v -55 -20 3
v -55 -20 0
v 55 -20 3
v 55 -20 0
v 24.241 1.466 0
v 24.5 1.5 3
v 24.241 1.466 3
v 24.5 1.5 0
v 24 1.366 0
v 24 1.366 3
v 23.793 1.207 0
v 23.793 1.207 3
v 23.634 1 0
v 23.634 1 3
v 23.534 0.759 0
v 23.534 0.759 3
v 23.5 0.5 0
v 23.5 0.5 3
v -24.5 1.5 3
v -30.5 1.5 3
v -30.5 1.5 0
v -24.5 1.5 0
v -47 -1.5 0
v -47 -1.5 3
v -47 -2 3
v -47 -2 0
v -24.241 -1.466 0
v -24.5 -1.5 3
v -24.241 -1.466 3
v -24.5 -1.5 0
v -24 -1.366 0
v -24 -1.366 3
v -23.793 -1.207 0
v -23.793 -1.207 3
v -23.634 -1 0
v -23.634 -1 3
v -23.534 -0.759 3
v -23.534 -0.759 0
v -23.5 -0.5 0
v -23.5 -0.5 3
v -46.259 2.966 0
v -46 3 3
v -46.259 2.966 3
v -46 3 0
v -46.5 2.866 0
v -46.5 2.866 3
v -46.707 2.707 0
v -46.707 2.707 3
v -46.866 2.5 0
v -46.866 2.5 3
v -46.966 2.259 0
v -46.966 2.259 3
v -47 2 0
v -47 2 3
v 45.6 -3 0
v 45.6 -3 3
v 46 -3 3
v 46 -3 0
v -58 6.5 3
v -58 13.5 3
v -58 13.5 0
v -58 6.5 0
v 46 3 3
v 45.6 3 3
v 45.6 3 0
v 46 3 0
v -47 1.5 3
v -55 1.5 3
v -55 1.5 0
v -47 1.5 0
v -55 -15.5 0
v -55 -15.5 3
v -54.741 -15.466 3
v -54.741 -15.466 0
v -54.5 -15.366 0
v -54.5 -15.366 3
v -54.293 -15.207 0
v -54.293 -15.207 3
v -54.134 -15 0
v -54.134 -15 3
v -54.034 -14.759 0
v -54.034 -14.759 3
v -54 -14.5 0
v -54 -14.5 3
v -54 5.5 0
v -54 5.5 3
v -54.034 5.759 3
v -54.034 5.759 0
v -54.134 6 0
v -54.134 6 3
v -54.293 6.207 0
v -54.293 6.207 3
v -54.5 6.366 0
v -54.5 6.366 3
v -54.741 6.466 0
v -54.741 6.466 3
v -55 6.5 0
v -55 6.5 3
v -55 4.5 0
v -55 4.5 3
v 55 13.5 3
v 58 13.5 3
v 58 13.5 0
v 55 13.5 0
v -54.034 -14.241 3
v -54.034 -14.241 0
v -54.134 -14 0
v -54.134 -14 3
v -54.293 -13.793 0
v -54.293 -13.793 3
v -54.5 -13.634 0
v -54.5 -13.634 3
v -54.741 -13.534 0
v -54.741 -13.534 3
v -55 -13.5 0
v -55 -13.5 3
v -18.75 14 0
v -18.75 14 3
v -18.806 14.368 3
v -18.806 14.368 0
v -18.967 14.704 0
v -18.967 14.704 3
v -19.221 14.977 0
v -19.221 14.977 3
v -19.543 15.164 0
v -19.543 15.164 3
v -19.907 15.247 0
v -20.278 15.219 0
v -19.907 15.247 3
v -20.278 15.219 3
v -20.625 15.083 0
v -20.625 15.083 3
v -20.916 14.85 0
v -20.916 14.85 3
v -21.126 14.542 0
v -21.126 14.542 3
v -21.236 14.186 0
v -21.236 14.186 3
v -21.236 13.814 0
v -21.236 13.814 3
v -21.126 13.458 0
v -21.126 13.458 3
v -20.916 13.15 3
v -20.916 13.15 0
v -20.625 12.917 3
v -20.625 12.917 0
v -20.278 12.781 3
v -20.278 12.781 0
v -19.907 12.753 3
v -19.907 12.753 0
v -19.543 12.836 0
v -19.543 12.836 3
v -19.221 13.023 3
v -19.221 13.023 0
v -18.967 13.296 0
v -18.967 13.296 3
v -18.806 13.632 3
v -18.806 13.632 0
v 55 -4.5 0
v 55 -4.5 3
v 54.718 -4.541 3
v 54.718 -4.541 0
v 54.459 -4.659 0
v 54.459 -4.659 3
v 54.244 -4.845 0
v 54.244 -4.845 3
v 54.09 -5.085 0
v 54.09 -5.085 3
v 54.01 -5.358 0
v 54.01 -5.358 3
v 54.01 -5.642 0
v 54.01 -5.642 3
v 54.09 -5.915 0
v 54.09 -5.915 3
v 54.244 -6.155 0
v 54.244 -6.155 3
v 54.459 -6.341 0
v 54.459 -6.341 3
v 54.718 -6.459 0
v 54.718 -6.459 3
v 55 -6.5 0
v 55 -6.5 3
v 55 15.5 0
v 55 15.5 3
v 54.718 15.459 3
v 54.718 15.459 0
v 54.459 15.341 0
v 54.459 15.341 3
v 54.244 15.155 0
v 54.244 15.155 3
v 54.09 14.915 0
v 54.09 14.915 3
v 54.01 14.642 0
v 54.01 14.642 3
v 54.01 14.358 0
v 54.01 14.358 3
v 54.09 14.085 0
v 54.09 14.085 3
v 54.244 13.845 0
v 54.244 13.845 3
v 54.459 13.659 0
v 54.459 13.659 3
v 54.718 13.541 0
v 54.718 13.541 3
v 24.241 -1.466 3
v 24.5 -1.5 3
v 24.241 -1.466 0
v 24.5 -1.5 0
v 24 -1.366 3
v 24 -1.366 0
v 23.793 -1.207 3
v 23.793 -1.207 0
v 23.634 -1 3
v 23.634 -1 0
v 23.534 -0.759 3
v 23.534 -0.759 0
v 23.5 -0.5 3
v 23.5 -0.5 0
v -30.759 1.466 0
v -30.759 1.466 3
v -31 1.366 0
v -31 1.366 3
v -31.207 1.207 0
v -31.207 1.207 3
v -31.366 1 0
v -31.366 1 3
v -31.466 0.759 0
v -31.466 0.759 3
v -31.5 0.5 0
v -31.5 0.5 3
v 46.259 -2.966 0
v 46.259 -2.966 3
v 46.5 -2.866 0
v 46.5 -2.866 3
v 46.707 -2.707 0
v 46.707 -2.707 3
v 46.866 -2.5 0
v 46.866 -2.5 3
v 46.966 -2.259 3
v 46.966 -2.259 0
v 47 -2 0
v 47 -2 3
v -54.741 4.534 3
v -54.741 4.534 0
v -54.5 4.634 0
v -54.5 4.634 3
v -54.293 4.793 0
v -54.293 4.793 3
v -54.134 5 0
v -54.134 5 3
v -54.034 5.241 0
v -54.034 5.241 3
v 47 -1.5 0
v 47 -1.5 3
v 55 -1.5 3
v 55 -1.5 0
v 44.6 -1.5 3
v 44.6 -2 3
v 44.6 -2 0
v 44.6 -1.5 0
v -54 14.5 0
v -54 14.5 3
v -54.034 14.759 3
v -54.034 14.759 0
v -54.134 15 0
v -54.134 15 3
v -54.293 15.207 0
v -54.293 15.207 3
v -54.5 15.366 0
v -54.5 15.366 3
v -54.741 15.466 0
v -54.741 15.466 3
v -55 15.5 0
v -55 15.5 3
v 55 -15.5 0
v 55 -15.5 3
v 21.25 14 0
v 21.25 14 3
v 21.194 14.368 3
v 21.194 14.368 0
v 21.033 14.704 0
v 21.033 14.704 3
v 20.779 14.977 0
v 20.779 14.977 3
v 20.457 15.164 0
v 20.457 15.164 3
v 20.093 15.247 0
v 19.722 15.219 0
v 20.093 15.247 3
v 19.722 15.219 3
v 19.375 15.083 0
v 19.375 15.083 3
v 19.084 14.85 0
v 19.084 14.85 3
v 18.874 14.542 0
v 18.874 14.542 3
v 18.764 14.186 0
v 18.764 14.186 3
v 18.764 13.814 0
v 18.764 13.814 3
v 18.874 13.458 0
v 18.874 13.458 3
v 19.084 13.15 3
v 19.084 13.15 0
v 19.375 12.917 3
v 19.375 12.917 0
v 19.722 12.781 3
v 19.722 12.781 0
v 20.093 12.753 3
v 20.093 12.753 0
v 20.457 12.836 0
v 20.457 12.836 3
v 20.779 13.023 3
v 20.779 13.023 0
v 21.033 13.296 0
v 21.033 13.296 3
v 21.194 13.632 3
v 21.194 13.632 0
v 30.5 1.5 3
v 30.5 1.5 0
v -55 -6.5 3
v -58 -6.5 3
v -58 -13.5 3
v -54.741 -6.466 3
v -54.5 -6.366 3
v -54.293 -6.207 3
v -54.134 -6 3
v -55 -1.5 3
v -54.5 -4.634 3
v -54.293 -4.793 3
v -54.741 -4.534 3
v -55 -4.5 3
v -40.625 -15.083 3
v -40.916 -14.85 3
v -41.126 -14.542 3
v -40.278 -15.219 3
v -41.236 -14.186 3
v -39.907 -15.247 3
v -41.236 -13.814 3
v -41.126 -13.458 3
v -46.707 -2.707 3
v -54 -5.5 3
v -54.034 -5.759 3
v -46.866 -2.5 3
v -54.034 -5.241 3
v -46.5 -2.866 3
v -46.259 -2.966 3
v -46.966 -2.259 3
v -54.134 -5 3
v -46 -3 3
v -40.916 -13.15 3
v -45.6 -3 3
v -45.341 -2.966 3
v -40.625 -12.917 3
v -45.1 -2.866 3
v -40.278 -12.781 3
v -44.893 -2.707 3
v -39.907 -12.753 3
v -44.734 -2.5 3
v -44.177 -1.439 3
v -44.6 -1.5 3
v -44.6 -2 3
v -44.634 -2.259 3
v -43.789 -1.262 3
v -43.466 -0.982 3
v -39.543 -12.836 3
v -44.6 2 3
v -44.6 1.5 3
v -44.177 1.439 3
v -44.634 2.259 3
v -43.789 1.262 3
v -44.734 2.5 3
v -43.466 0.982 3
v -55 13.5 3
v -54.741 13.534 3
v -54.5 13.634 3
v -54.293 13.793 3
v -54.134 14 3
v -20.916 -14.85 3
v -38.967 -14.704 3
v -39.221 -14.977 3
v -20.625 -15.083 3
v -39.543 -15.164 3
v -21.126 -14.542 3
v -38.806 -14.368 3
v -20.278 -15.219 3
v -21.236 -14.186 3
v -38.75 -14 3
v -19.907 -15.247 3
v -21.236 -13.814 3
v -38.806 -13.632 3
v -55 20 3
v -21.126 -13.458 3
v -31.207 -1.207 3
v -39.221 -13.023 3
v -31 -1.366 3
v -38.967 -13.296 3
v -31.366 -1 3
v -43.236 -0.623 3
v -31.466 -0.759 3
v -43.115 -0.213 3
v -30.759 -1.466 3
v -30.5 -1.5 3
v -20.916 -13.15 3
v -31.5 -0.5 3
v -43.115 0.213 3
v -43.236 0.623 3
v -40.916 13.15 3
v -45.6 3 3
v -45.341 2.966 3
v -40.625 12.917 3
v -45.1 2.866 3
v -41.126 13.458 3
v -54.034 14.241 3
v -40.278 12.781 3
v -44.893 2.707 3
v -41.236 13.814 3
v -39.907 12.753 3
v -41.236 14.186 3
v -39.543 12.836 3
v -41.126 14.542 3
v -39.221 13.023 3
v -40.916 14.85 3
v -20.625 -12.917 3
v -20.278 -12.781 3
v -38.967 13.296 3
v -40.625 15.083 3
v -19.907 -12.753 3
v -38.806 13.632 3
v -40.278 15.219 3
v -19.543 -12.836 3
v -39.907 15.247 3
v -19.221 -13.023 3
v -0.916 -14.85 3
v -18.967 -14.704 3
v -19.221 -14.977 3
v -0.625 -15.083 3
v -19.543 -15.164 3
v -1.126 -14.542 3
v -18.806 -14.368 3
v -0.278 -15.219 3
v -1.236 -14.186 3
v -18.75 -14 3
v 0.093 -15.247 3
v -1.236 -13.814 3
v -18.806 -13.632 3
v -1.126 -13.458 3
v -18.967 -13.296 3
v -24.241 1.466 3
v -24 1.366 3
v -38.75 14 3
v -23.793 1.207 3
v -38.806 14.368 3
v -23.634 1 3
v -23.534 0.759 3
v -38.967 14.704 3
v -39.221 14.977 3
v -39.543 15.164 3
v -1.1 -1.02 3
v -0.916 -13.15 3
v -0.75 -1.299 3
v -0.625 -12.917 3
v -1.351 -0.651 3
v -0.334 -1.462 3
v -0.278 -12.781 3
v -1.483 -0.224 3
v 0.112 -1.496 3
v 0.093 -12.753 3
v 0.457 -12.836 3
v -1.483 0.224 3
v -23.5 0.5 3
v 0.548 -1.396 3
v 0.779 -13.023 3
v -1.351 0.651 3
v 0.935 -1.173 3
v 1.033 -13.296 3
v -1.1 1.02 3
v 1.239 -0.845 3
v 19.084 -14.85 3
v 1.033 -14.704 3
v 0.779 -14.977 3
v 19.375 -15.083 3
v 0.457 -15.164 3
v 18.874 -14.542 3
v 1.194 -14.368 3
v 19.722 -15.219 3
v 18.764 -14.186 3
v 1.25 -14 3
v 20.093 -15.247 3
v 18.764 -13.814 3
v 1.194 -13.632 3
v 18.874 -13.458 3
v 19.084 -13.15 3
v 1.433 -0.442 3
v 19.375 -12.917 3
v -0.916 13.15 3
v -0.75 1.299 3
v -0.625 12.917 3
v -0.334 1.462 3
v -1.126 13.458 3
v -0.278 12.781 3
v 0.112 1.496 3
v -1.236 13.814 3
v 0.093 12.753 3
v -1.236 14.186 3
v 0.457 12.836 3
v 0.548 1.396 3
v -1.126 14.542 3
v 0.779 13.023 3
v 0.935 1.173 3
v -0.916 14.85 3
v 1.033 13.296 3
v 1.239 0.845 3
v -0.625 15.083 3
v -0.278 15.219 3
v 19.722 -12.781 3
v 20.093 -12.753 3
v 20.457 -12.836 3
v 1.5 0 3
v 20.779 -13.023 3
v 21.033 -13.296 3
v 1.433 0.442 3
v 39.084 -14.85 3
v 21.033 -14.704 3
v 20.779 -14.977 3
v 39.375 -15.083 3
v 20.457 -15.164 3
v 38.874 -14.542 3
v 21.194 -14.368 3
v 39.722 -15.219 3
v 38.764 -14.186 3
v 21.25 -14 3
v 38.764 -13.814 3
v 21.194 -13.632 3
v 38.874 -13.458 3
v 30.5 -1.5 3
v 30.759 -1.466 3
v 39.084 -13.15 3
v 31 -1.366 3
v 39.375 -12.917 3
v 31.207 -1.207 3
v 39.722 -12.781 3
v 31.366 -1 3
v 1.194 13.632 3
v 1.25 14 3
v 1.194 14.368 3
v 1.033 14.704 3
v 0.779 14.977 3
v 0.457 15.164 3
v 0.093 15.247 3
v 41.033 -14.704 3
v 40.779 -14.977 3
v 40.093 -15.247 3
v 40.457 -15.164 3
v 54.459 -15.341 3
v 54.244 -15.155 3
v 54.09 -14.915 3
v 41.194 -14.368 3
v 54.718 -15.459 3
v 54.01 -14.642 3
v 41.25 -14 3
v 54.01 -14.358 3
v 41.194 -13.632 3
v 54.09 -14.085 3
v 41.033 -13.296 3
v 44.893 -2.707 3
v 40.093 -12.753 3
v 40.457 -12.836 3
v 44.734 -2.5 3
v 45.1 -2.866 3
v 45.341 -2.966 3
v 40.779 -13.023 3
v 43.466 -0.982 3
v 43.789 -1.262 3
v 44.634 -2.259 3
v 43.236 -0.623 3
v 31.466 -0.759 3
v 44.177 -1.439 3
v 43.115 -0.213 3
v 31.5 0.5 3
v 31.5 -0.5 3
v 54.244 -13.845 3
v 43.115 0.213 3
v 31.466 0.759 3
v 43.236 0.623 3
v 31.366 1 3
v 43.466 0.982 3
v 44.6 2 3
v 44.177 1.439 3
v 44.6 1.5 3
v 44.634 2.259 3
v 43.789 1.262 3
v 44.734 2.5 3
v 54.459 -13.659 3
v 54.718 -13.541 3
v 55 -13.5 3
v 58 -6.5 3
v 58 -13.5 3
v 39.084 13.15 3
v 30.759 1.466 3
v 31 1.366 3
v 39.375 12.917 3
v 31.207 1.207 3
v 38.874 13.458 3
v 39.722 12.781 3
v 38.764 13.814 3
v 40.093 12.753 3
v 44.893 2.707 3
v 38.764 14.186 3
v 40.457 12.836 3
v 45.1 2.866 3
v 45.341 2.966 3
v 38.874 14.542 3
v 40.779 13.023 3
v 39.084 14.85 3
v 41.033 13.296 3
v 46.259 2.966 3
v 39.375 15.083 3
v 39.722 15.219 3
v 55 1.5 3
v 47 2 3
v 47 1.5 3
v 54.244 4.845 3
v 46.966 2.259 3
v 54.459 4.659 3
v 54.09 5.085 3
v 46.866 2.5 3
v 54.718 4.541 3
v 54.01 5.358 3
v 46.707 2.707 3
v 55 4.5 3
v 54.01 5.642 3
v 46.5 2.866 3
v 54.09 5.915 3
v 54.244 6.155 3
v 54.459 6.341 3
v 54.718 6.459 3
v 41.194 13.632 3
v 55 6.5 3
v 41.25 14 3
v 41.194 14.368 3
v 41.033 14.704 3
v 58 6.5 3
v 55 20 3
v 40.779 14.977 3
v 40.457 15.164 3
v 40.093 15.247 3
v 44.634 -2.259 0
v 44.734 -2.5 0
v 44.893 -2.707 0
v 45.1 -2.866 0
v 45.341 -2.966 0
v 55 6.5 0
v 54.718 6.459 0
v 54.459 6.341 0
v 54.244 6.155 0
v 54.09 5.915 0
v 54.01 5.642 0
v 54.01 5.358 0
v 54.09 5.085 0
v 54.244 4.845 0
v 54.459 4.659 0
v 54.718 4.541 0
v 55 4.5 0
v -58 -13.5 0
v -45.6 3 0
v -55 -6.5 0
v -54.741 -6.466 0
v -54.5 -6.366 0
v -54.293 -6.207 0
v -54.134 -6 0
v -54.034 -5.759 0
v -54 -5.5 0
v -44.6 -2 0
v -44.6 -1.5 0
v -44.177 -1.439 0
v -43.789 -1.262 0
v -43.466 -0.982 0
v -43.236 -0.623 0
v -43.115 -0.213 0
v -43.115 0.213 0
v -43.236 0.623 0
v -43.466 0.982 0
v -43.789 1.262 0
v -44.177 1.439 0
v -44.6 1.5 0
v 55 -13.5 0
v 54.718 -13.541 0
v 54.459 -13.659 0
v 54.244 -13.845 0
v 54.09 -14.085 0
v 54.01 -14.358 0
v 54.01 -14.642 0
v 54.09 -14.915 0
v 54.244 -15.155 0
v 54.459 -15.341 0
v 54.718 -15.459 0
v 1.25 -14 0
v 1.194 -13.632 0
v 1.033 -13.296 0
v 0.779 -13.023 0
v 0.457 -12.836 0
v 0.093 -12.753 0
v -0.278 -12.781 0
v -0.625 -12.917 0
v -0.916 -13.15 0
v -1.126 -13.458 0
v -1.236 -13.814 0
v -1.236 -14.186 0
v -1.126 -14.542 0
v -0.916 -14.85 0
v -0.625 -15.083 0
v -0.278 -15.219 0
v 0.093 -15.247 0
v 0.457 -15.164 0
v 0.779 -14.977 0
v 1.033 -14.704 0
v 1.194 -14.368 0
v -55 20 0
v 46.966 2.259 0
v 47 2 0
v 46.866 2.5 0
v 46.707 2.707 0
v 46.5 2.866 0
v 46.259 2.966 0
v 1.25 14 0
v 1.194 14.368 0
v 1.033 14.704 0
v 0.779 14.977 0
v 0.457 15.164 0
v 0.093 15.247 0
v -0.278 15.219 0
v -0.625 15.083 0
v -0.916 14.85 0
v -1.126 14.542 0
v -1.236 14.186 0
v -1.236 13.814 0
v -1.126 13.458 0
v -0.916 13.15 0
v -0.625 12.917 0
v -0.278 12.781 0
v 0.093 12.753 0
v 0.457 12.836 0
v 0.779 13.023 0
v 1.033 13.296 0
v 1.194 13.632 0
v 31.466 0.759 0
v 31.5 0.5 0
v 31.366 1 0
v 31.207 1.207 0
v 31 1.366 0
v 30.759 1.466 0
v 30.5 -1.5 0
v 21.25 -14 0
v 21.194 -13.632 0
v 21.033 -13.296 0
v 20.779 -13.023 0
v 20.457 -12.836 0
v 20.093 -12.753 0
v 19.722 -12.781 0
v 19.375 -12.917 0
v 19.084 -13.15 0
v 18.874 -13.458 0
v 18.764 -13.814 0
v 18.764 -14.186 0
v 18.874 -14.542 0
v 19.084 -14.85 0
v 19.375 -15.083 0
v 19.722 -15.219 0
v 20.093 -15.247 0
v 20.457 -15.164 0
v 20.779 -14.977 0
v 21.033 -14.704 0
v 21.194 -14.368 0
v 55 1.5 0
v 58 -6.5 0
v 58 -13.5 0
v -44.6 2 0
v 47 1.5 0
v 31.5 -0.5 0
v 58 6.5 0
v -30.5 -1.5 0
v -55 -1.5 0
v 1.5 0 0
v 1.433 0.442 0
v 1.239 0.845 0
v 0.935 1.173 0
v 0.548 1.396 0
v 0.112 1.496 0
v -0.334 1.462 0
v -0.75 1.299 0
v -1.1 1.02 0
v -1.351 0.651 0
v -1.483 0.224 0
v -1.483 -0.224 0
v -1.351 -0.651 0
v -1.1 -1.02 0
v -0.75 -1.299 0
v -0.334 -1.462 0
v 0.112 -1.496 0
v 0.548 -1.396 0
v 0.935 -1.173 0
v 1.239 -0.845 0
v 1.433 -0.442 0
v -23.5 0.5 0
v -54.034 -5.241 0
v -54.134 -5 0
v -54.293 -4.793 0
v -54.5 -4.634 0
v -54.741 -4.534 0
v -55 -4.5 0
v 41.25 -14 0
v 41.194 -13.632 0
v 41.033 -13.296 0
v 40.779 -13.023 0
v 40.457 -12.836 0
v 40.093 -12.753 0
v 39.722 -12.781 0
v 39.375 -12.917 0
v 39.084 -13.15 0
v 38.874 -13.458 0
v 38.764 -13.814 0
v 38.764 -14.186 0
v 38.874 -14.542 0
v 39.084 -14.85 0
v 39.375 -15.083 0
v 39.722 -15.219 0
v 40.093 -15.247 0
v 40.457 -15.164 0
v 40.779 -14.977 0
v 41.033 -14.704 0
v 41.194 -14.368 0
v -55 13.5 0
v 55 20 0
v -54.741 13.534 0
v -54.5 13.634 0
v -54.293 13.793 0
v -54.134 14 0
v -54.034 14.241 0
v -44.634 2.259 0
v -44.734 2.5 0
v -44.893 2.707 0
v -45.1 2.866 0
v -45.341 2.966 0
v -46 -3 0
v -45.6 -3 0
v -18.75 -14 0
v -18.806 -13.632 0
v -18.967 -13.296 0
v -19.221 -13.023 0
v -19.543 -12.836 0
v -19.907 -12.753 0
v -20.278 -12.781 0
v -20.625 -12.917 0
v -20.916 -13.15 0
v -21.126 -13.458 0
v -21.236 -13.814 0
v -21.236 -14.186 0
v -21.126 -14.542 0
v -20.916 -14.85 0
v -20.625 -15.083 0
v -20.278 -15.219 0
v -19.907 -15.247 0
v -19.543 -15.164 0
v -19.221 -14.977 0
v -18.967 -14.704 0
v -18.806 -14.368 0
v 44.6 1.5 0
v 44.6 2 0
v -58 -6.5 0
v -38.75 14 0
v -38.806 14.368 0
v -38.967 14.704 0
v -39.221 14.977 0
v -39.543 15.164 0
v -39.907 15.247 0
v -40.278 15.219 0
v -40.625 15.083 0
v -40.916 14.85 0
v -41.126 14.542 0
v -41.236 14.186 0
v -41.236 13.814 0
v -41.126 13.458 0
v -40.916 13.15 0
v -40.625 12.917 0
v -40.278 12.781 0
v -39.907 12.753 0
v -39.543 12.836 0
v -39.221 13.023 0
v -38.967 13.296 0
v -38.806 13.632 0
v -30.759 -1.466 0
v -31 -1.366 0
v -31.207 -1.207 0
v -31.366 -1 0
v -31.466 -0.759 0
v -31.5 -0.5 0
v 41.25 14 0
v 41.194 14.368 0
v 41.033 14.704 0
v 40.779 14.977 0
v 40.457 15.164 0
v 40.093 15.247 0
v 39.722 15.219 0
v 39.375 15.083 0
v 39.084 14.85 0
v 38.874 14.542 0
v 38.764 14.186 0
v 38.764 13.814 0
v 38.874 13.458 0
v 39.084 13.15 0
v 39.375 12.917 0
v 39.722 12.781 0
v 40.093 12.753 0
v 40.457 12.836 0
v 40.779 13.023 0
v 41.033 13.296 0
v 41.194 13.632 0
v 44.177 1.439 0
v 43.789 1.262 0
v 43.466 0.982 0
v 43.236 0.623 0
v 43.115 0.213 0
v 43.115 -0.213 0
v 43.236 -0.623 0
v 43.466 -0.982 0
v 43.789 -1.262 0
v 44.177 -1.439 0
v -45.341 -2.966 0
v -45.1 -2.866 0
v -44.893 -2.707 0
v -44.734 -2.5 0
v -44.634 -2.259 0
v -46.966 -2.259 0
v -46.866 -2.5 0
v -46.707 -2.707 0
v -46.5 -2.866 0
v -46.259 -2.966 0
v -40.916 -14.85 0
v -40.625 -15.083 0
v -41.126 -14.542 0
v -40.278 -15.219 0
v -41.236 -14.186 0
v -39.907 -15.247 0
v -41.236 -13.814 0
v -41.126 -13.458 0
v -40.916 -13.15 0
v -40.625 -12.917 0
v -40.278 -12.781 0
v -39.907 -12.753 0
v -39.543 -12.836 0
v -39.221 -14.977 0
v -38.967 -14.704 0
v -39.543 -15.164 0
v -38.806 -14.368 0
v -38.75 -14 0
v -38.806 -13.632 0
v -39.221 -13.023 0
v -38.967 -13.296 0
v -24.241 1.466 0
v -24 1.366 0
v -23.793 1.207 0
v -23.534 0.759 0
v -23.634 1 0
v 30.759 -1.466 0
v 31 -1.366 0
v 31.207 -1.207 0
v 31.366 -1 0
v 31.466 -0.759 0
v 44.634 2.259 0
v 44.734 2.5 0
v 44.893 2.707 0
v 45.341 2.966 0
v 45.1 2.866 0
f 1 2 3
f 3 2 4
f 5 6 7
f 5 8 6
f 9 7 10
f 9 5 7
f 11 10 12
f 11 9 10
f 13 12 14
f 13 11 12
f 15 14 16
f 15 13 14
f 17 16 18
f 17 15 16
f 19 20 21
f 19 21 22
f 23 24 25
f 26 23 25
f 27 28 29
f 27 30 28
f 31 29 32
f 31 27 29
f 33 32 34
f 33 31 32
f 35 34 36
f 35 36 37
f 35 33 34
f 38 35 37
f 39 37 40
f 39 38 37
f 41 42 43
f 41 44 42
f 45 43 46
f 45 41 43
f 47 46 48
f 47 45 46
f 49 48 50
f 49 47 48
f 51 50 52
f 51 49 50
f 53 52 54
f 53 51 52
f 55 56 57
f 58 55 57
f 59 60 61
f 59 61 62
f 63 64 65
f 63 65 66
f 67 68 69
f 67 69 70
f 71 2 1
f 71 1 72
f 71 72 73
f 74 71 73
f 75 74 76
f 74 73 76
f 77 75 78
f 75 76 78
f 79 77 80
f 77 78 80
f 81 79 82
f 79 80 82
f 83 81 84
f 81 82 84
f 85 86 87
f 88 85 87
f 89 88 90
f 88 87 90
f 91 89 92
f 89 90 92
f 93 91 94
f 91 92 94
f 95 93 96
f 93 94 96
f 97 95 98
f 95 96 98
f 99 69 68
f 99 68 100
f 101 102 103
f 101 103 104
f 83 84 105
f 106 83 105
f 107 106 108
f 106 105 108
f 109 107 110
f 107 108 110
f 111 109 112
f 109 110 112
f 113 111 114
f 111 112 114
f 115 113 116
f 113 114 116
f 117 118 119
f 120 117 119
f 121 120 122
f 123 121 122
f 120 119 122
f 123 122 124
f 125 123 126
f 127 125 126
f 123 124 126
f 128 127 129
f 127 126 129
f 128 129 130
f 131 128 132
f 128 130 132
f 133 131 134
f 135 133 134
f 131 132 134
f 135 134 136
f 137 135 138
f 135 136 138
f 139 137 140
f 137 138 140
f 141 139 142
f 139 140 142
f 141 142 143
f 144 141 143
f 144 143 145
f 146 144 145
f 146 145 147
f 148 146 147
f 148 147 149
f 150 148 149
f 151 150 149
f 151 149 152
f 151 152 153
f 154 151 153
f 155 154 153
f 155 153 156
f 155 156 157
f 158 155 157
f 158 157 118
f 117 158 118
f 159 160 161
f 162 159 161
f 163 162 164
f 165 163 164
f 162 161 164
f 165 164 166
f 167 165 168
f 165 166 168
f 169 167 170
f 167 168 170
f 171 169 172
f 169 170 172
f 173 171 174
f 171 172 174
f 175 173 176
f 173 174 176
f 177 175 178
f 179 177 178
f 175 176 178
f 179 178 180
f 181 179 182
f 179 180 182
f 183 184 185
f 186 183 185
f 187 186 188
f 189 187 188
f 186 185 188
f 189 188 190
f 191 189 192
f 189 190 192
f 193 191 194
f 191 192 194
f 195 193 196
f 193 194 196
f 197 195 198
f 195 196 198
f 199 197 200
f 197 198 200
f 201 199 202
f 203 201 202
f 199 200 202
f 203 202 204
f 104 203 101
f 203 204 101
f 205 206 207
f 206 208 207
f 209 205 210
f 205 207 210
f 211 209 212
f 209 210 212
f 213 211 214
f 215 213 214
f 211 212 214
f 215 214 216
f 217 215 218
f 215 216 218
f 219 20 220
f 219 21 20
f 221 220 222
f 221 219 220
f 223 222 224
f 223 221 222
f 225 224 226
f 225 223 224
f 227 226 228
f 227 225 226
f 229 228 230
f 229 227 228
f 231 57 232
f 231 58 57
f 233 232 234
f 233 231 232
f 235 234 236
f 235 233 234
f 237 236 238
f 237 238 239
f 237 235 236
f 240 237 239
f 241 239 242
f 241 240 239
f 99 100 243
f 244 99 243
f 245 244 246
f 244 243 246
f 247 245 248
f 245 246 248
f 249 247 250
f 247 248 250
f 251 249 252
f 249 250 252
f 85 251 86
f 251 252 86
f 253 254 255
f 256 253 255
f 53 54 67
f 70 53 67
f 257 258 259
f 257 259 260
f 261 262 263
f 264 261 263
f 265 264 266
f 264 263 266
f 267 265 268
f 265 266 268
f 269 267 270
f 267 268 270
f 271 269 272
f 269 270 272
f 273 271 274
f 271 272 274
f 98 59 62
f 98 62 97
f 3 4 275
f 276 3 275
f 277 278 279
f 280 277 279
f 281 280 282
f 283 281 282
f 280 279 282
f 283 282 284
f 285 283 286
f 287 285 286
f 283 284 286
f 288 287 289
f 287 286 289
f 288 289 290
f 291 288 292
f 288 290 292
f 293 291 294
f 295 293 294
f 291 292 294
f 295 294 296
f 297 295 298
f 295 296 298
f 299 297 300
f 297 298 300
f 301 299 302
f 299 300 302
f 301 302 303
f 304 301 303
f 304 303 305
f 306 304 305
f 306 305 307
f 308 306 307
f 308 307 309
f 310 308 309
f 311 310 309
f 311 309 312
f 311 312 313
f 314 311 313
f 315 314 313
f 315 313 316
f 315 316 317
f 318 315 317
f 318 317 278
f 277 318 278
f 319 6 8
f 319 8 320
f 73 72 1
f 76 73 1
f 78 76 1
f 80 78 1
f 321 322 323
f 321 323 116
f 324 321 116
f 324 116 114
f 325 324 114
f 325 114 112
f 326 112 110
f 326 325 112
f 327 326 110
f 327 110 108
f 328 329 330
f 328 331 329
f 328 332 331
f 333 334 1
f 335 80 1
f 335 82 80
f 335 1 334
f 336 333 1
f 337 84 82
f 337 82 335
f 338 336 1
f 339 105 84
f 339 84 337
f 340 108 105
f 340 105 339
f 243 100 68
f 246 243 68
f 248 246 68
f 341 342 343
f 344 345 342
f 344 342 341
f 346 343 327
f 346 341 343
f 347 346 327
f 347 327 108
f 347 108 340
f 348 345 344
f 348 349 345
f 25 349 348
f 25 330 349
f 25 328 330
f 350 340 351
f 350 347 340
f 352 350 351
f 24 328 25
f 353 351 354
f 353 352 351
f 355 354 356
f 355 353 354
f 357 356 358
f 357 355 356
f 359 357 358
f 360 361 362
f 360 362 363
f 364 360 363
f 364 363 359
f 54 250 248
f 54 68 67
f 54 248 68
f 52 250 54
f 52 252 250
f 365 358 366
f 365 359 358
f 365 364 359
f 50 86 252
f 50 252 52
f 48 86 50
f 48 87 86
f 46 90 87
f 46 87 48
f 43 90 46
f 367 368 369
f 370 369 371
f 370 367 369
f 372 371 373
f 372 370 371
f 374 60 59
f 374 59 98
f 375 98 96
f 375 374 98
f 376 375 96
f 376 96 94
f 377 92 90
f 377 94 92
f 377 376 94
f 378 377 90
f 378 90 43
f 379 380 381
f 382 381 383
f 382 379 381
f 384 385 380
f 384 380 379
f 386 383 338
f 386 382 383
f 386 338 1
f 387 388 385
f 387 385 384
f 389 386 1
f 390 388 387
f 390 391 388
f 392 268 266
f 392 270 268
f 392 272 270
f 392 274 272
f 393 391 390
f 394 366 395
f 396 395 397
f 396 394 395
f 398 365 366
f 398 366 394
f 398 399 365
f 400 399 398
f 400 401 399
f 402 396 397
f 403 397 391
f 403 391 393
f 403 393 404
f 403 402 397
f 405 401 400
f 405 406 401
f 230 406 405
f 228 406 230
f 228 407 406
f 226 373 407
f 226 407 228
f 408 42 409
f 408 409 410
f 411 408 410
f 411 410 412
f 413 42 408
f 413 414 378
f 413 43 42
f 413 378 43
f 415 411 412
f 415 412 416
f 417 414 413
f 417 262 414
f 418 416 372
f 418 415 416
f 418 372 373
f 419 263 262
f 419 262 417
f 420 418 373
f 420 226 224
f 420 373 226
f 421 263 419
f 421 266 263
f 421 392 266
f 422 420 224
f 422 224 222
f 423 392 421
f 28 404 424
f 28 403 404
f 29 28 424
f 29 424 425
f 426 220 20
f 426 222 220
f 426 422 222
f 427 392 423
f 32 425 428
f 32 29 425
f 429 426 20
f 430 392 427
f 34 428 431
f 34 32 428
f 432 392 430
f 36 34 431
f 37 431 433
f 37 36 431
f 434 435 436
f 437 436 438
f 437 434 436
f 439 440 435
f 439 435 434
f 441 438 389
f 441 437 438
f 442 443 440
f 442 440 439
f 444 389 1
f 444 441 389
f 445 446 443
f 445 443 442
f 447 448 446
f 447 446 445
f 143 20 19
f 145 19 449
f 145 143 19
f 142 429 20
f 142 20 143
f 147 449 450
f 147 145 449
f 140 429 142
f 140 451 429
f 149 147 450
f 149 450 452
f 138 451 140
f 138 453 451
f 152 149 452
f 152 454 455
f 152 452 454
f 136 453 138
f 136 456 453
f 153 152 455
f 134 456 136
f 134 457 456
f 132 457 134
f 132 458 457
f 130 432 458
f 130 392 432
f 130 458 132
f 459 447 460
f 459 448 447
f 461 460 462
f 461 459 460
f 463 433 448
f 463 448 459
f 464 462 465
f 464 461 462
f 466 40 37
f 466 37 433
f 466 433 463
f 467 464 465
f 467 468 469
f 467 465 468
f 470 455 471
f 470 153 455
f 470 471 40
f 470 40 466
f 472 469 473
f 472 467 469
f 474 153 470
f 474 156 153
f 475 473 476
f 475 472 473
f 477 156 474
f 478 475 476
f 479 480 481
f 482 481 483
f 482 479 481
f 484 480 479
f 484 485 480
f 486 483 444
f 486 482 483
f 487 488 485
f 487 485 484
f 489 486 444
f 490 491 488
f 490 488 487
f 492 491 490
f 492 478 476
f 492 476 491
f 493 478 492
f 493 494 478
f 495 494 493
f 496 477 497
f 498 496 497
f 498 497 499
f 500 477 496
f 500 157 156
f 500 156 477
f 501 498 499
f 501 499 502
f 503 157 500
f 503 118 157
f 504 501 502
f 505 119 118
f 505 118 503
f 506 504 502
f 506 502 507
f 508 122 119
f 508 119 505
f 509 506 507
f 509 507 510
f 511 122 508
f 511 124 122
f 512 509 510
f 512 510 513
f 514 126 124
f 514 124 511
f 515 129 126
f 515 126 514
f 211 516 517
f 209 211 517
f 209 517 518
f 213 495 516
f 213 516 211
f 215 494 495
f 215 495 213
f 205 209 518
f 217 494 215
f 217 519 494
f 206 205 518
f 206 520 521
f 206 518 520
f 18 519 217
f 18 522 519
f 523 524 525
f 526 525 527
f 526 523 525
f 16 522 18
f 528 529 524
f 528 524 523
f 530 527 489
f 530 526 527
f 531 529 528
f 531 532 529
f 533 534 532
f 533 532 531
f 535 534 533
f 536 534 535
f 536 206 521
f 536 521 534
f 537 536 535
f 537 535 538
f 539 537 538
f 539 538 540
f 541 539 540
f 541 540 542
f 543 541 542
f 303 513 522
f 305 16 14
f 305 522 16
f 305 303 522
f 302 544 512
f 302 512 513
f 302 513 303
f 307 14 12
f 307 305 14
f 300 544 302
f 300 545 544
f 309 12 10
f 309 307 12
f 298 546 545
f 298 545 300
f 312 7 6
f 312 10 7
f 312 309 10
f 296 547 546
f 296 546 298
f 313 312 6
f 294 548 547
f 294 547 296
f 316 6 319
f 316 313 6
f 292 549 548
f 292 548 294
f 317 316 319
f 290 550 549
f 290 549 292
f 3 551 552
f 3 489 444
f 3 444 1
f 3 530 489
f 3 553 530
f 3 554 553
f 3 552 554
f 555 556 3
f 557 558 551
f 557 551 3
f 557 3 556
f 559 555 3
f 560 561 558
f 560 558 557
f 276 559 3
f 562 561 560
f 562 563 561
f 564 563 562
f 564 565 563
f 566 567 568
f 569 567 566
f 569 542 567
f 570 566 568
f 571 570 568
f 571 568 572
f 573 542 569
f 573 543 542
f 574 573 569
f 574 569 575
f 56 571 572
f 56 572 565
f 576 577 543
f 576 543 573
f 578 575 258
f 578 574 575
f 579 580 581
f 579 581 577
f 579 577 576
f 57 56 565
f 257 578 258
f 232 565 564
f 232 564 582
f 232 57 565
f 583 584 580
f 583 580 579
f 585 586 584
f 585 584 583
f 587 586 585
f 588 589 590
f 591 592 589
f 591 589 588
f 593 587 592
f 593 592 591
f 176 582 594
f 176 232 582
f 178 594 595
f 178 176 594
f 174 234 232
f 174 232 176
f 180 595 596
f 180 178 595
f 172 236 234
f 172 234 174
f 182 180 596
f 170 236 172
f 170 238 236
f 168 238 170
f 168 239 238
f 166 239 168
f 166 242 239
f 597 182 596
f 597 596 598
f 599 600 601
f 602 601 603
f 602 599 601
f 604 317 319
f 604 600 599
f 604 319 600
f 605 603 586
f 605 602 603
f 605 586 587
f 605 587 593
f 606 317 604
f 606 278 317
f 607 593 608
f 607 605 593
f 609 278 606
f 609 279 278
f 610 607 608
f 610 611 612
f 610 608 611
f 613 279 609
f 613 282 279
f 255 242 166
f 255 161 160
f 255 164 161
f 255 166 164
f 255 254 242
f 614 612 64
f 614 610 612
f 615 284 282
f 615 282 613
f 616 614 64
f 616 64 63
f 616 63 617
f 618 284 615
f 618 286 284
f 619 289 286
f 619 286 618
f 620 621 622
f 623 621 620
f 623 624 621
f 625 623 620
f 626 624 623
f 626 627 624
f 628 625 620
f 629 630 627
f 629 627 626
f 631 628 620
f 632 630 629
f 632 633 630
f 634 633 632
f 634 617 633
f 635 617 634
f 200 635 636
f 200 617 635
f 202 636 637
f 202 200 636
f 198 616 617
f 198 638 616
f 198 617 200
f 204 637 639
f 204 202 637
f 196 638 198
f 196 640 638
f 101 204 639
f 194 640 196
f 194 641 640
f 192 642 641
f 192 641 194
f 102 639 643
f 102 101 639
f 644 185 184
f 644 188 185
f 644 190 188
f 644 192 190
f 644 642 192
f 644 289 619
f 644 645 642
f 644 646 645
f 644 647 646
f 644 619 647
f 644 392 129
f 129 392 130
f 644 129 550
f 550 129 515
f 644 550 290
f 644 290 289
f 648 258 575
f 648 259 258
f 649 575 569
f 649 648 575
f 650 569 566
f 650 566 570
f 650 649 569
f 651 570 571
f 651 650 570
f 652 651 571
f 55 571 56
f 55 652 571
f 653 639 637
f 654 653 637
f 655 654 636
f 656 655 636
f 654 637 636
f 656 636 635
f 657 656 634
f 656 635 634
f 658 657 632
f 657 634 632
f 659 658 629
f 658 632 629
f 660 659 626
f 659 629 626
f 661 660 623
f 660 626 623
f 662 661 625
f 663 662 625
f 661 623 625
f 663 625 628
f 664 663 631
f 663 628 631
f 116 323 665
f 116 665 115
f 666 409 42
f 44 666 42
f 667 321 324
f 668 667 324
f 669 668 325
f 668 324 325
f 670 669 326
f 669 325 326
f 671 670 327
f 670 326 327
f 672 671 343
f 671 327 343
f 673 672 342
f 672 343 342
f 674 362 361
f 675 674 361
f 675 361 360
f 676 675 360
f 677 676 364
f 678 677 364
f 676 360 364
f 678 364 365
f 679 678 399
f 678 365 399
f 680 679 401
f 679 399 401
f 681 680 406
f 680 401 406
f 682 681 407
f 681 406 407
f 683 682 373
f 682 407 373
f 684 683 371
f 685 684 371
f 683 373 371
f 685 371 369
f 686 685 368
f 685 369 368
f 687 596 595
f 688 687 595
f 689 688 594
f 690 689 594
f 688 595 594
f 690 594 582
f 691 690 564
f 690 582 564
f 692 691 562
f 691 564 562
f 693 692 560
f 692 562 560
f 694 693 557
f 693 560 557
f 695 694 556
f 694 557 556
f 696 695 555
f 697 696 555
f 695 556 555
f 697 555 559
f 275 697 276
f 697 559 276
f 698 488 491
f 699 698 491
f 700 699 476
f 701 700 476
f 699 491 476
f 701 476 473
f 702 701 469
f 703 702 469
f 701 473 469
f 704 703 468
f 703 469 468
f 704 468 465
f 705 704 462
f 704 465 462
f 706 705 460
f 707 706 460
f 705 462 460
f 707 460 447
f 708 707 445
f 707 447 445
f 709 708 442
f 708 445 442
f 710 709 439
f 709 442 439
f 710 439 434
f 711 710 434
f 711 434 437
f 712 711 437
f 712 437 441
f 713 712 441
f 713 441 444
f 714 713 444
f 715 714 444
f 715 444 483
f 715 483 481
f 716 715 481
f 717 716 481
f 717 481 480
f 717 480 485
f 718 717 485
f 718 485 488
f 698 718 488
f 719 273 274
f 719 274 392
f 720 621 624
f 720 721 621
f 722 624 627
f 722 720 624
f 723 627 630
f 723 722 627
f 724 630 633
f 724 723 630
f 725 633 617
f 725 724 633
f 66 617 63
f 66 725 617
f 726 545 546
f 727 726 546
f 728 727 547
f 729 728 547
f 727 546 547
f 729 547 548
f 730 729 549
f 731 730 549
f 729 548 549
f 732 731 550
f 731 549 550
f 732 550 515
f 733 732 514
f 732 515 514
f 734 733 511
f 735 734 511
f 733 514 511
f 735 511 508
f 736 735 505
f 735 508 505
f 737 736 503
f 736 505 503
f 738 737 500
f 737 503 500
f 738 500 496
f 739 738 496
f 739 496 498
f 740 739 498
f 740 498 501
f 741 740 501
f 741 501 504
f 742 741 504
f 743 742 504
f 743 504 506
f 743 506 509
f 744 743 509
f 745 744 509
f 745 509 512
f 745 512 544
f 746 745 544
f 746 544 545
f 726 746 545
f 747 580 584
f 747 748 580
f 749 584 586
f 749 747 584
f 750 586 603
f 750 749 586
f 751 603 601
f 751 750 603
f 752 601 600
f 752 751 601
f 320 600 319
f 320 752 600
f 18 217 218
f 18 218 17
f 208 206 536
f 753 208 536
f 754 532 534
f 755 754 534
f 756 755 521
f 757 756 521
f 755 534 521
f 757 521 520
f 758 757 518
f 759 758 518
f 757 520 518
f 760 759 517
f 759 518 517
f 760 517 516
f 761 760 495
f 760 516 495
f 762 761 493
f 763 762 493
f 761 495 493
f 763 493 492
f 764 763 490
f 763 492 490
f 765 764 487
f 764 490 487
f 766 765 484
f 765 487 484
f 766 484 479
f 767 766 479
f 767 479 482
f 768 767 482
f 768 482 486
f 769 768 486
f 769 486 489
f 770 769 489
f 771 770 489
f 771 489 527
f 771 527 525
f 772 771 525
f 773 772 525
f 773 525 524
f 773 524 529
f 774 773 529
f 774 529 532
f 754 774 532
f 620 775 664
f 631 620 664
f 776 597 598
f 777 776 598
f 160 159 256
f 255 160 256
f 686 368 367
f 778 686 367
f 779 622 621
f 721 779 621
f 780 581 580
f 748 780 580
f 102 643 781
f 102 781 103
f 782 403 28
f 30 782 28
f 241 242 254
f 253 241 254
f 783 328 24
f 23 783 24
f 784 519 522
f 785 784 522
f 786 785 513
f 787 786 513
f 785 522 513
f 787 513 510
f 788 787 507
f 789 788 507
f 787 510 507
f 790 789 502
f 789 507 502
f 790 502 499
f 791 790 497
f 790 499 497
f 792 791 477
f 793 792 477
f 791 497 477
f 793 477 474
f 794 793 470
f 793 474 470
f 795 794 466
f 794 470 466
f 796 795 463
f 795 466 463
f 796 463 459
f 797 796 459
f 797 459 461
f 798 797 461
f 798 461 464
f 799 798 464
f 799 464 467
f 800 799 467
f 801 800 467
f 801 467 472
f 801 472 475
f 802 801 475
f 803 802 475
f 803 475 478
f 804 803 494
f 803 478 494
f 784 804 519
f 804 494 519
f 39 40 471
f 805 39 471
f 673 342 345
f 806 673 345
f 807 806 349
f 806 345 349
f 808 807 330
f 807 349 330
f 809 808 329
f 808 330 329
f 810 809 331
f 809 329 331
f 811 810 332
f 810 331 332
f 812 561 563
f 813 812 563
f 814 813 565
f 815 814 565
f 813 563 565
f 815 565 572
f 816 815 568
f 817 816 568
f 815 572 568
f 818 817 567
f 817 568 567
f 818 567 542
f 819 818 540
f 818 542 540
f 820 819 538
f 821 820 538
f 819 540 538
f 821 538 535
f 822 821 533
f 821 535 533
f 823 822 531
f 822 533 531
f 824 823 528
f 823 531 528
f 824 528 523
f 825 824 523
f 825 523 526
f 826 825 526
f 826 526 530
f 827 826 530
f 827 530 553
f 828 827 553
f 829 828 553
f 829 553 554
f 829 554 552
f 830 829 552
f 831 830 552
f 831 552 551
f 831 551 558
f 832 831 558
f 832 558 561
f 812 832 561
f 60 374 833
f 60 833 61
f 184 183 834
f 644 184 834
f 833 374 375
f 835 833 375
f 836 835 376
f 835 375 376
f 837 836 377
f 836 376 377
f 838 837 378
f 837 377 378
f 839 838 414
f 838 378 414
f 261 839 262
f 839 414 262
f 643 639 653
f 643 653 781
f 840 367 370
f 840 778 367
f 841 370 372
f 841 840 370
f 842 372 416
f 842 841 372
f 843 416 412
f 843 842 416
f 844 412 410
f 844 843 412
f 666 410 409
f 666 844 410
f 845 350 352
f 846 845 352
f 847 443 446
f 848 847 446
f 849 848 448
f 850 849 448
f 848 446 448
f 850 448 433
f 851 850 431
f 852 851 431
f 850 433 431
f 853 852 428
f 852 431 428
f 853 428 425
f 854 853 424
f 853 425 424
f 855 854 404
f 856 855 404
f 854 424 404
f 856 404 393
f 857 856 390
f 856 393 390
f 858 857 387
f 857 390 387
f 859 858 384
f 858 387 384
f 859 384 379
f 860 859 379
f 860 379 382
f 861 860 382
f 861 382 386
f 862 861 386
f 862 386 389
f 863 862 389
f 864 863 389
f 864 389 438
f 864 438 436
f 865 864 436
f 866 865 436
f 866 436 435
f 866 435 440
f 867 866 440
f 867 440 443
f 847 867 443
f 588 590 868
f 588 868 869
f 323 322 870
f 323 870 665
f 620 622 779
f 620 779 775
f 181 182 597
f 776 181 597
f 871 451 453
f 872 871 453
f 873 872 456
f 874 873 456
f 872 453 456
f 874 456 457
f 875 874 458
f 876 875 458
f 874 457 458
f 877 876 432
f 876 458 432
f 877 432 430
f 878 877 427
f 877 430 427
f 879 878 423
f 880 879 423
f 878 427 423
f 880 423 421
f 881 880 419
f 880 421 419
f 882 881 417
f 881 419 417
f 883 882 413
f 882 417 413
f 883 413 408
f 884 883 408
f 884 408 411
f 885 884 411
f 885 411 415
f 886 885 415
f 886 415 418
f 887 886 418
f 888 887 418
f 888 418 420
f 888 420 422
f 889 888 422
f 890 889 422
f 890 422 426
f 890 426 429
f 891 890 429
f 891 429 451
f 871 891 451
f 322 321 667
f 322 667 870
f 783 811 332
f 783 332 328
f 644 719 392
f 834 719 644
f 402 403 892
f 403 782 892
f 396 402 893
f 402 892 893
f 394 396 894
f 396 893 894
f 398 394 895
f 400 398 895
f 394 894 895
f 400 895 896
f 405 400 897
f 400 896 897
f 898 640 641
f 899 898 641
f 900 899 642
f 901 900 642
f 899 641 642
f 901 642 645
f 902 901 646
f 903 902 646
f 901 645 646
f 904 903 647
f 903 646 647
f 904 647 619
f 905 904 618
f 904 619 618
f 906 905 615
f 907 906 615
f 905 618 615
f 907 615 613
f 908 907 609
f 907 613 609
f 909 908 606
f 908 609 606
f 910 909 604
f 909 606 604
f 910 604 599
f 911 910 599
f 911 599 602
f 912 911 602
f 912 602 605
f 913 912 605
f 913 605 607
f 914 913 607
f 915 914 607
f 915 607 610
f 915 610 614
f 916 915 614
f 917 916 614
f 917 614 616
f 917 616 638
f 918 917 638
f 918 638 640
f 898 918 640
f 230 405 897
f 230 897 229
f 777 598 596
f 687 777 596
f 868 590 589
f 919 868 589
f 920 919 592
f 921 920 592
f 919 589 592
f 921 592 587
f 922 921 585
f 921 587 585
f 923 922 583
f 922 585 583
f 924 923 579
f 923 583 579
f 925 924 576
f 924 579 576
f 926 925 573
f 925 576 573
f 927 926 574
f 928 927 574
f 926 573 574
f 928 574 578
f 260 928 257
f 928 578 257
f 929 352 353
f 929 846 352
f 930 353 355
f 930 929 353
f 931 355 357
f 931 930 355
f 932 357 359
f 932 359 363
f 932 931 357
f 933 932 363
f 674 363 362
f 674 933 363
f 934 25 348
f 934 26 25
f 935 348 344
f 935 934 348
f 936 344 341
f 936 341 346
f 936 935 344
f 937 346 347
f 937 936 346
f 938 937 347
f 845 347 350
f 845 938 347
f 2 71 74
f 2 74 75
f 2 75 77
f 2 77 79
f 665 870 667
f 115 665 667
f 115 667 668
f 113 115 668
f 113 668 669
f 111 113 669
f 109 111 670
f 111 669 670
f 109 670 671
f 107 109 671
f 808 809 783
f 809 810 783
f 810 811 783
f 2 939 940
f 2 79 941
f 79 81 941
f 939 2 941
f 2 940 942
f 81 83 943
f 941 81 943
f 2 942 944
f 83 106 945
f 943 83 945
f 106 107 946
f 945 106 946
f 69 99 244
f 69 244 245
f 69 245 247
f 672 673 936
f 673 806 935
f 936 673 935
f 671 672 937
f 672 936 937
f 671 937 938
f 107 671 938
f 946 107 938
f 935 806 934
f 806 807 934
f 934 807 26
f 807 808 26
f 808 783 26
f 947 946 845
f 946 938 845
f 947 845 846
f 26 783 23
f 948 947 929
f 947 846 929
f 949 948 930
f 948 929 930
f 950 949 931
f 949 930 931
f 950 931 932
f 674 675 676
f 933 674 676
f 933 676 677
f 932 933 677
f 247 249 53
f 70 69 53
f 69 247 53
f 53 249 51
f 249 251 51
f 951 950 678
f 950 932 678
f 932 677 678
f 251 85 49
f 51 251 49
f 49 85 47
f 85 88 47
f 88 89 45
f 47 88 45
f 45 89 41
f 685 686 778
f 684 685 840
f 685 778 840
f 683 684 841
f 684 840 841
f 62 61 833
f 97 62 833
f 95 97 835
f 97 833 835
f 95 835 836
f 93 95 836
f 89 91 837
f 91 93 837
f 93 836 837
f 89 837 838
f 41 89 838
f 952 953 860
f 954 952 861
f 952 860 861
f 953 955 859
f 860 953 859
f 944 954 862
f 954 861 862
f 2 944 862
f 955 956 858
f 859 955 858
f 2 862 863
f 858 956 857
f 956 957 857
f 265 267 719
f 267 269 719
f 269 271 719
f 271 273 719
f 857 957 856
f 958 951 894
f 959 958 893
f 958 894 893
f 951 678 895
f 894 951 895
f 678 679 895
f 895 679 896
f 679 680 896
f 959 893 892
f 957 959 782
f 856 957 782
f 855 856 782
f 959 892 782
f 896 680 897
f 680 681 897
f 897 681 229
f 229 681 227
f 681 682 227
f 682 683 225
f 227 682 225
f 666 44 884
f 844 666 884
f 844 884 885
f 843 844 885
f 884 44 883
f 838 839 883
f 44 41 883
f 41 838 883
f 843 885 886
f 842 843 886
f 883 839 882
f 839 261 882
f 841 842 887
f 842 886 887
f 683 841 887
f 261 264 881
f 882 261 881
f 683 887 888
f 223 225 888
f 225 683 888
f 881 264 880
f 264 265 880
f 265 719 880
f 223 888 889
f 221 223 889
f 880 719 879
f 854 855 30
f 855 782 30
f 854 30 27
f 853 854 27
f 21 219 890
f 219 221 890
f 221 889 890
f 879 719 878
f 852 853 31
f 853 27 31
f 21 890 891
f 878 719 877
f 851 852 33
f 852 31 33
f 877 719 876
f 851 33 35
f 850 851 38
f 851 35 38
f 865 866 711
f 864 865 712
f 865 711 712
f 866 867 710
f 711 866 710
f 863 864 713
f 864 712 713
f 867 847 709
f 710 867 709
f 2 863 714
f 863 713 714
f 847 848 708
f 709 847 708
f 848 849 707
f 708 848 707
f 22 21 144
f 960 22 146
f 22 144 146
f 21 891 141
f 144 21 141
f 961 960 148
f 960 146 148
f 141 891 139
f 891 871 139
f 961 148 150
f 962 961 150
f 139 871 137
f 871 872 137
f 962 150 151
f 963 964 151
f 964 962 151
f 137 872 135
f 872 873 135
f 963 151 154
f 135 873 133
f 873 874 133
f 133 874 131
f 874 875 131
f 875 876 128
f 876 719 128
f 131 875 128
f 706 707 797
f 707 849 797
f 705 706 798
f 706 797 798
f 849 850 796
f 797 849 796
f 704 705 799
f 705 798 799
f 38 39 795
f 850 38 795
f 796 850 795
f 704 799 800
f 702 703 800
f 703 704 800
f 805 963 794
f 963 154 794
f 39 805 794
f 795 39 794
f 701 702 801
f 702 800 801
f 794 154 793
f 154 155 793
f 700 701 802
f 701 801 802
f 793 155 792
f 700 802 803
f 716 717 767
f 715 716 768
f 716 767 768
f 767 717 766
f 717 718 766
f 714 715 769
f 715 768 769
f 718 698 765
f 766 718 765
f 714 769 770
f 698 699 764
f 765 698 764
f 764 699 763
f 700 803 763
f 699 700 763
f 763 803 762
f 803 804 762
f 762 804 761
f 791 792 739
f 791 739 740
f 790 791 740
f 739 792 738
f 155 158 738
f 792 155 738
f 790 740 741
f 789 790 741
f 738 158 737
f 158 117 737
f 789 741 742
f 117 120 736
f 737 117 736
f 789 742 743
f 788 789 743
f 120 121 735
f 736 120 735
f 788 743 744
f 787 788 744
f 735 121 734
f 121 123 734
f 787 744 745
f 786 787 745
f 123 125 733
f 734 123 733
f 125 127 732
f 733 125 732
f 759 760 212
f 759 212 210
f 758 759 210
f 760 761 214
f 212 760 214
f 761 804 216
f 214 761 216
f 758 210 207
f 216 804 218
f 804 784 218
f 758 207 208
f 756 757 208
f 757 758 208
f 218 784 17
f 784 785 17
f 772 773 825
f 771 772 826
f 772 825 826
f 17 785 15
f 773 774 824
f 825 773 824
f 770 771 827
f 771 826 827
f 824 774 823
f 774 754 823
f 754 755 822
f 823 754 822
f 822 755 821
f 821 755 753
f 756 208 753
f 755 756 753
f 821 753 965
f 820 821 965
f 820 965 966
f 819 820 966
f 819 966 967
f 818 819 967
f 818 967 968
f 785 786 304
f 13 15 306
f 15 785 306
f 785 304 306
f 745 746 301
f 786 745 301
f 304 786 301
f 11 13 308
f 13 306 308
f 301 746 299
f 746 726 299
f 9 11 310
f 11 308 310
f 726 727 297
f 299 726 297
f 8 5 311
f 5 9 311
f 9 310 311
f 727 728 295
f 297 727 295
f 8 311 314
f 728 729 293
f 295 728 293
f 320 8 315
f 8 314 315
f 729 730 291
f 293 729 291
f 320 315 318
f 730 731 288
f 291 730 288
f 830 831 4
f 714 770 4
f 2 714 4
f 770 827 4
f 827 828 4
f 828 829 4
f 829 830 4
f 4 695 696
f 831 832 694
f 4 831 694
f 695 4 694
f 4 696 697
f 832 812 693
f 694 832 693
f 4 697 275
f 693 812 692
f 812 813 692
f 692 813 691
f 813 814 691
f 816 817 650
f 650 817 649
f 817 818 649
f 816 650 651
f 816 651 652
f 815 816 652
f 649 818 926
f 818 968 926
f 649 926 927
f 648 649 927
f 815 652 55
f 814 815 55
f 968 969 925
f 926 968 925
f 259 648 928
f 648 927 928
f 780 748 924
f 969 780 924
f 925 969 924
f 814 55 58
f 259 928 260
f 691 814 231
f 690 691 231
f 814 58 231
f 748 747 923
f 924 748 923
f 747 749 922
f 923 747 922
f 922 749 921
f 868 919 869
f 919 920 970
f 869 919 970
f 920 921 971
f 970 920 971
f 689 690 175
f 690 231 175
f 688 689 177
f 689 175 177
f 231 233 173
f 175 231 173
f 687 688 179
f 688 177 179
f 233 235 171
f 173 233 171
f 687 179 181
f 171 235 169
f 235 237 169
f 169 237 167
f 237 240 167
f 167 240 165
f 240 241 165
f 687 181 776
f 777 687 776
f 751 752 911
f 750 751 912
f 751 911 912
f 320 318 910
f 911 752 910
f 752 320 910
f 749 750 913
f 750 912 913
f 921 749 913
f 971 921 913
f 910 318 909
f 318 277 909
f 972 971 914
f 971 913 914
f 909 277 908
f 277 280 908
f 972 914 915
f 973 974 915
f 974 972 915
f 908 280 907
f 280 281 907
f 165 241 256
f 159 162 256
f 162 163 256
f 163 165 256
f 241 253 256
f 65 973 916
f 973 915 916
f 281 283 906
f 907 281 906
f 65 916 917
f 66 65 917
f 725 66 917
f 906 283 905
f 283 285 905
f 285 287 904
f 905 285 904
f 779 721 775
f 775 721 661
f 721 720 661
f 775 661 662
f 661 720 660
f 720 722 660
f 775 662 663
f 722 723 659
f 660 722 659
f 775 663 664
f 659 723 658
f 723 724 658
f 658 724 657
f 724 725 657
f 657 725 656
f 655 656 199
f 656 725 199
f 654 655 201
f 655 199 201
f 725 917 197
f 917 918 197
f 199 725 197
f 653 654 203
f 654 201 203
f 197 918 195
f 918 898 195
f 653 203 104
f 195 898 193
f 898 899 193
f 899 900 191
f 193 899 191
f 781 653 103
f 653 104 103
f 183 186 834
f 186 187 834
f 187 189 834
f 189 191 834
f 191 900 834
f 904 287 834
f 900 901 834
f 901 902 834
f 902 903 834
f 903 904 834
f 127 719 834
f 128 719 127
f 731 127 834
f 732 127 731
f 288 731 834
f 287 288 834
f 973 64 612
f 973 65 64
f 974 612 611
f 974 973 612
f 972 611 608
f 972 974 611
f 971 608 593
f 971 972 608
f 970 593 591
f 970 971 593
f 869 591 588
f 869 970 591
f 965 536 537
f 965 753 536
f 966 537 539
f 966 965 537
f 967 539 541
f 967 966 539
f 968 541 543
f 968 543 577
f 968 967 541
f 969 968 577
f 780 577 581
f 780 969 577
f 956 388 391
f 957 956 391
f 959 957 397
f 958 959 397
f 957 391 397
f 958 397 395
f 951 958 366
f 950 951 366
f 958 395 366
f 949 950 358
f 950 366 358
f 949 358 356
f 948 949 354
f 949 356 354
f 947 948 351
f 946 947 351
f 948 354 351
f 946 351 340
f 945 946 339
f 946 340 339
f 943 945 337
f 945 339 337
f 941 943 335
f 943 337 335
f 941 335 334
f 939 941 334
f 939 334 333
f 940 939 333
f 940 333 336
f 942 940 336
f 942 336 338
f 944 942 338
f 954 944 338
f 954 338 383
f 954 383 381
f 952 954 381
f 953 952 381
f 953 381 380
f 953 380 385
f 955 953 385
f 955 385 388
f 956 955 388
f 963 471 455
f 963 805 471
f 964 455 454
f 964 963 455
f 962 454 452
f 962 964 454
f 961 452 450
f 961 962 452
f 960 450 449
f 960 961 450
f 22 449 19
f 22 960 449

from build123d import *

# Parameters (mm, degrees)
SKETCH1_W           = 110
SKETCH1_H           = 40
BOSS_EXTRUDE1_DEPTH = 3
BOSS_EXTRUDE2_DEPTH = 3
SKETCH3_R           = 1.5
CUT_EXTRUDE1_DEPTH  = 3
SKETCH4_W           = 8
SKETCH4_H           = 3
SKETCH4_W_2         = 2.4
SKETCH4_H_2         = 6
CUT_EXTRUDE2_DEPTH  = 3
FILLET6_R           = 1
SKETCH5_W           = 8
SKETCH5_H           = 3
CUT_EXTRUDE3_DEPTH  = 10
FILLET7_R           = 1
SKETCH6_R           = 1.25
CUT_EXTRUDE4_DEPTH  = 62.424750712


with BuildPart() as part:
    # Sketch1 → Boss-Extrude1 (new body)
    with BuildSketch(Plane.XY):
        Rectangle(SKETCH1_W, SKETCH1_H)
    extrude(amount=BOSS_EXTRUDE1_DEPTH)

    # Sketch2 → Boss-Extrude2 (add)
    with BuildSketch(Plane.XY.offset(3)):
        Polygon((58, 10), (58, 13.5), (55, 13.5), (55, 6.5), (58, 6.5), align=None)
        Polygon((55, -10), (55, -6.5), (58, -6.5), (58, -13.5), (55, -13.5), align=None)
        Polygon((-55, 6.5), (-55, 13.5), (-58, 13.5), (-58, 10), (-58, 6.5), align=None)
        Polygon((-55, -13.5), (-55, -10), (-55, -6.5), (-58, -6.5), (-58, -13.5), align=None)
    extrude(amount=-BOSS_EXTRUDE2_DEPTH)

    # Sketch3 → Cut-Extrude1 (cut)
    with BuildSketch(Plane.XY.offset(3)):
        with BuildLine():
            ThreePointArc((-55, -15.5), (-54.292893219, -15.207106781), (-54, -14.5))
            ThreePointArc((-54, -14.5), (-54.292893219, -13.792893219), (-55, -13.5))
            Line((-55, -13.5), (-55, -15.5))
        make_face()
        with BuildLine():
            Line((-55, -15.5), (-55, -13.5))
            ThreePointArc((-55, -13.5), (-56, -14.5), (-55, -15.5))
        make_face()
        with BuildLine():
            ThreePointArc((-54, -5.5), (-54.292893219, -4.792893219), (-55, -4.5))
            Line((-55, -4.5), (-55, -6.5))
            ThreePointArc((-55, -6.5), (-54.292893219, -6.207106781), (-54, -5.5))
        make_face()
        with BuildLine():
            Line((-55, -6.5), (-55, -4.5))
            ThreePointArc((-55, -4.5), (-56, -5.5), (-55, -6.5))
        make_face()
        with BuildLine():
            ThreePointArc((-55, 4.5), (-54.292893219, 4.792893219), (-54, 5.5))
            ThreePointArc((-54, 5.5), (-54.292893219, 6.207106781), (-55, 6.5))
            Line((-55, 6.5), (-55, 4.5))
        make_face()
        with BuildLine():
            Line((-55, 4.5), (-55, 6.5))
            ThreePointArc((-55, 6.5), (-56, 5.5), (-55, 4.5))
        make_face()
        with BuildLine():
            Line((-55, 15.5), (-55, 13.5))
            ThreePointArc((-55, 13.5), (-54.292893219, 13.792893219), (-54, 14.5))
            ThreePointArc((-54, 14.5), (-54.292893219, 15.207106781), (-55, 15.5))
        make_face()
        with BuildLine():
            ThreePointArc((-55, 15.5), (-56, 14.5), (-55, 13.5))
            Line((-55, 13.5), (-55, 15.5))
        make_face()
        Circle(SKETCH3_R)
        with BuildLine():
            ThreePointArc((56, -5.5), (55.707106781, -4.792893219), (55, -4.5))
            Line((55, -4.5), (55, -6.5))
            ThreePointArc((55, -6.5), (55.707106781, -6.207106781), (56, -5.5))
        make_face()
        with BuildLine():
            Line((55, -6.5), (55, -4.5))
            ThreePointArc((55, -4.5), (54, -5.5), (55, -6.5))
        make_face()
        with BuildLine():
            ThreePointArc((55, -15.5), (55.707106781, -15.207106781), (56, -14.5))
            ThreePointArc((56, -14.5), (55.707106781, -13.792893219), (55, -13.5))
            Line((55, -13.5), (55, -15.5))
        make_face()
        with BuildLine():
            Line((55, -15.5), (55, -13.5))
            ThreePointArc((55, -13.5), (54, -14.5), (55, -15.5))
        make_face()
        with BuildLine():
            ThreePointArc((55, 4.5), (55.707106781, 4.792893219), (56, 5.5))
            ThreePointArc((56, 5.5), (55.707106781, 6.207106781), (55, 6.5))
            Line((55, 6.5), (55, 4.5))
        make_face()
        with BuildLine():
            Line((55, 4.5), (55, 6.5))
            ThreePointArc((55, 6.5), (54, 5.5), (55, 4.5))
        make_face()
        with BuildLine():
            Line((55, 15.5), (55, 13.5))
            ThreePointArc((55, 13.5), (55.707106781, 13.792893219), (56, 14.5))
            ThreePointArc((56, 14.5), (55.707106781, 15.207106781), (55, 15.5))
        make_face()
        with BuildLine():
            ThreePointArc((55, 15.5), (54, 14.5), (55, 13.5))
            Line((55, 13.5), (55, 15.5))
        make_face()
    extrude(amount=-CUT_EXTRUDE1_DEPTH, mode=Mode.SUBTRACT)

    # Sketch4 → Cut-Extrude2 (cut)
    with BuildSketch(Plane.XY.offset(3)):
        with Locations((-51, 0)):
            Rectangle(SKETCH4_W, SKETCH4_H)
        Polygon((-47, 3), (-47, 1.5), (-47, -1.5), (-47, -3), (-44.6, -3), (-44.6, -1.5), (-44.6, 1.5), (-44.6, 3), align=None)
        with BuildLine():
            ThreePointArc((-44.6, -1.5), (-43.1, 0), (-44.6, 1.5))
            Line((-44.6, 1.5), (-44.6, -1.5))
        make_face()
        with Locations((45.8, 0)):
            Rectangle(SKETCH4_W_2, SKETCH4_H_2)
        with BuildLine():
            Line((44.6, -1.5), (44.6, 1.5))
            ThreePointArc((44.6, 1.5), (43.1, 0), (44.6, -1.5))
        make_face()
        with Locations((51, 0)):
            Rectangle(SKETCH4_W, SKETCH4_H)
    extrude(amount=-CUT_EXTRUDE2_DEPTH, mode=Mode.SUBTRACT)

    # Fillet6
    fillet6_edges = [part.edges().sort_by_distance(p)[0] for p in [
        (-47, 3, 1.5),
        (-44.6, 3, 1.5),
        (-44.6, -3, 1.5),
        (-47, -3, 1.5),
        (47, 3, 1.5),
        (47, -3, 1.5),
        (44.6, -3, 1.5),
        (44.6, 3, 1.5),
    ]]
    fillet(fillet6_edges, radius=FILLET6_R)

    # Sketch5 → Cut-Extrude3 (cut)
    with BuildSketch(Plane.XY.offset(3)):
        with Locations((-27.5, 0)):
            Rectangle(SKETCH5_W, SKETCH5_H)
        with Locations((27.5, 0)):
            Rectangle(SKETCH5_W, SKETCH5_H)
    extrude(amount=-CUT_EXTRUDE3_DEPTH, mode=Mode.SUBTRACT)

    # Fillet7
    fillet7_edges = [part.edges().sort_by_distance(p)[0] for p in [
        (-23.5, 1.5, 1.5),
        (-23.5, -1.5, 1.5),
        (-31.5, -1.5, 1.5),
        (-31.5, 1.5, 1.5),
        (31.5, 1.5, 1.5),
        (31.5, -1.5, 1.5),
        (23.5, -1.5, 1.5),
        (23.5, 1.5, 1.5),
    ]]
    fillet(fillet7_edges, radius=FILLET7_R)

    # Sketch6 → Cut-Extrude4 (cut, through all)
    with BuildSketch(Plane.XY.offset(3)):
        with Locations((-40, -14)):
            Circle(SKETCH6_R)
        with Locations((-20, -14)):
            Circle(SKETCH6_R)
        with Locations((0, -14)):
            Circle(SKETCH6_R)
        with Locations((20, -14)):
            Circle(SKETCH6_R)
        with Locations((40, -14)):
            Circle(SKETCH6_R)
        with Locations((40, 14)):
            Circle(SKETCH6_R)
        with Locations((20, 14)):
            Circle(SKETCH6_R)
        with Locations((0, 14)):
            Circle(SKETCH6_R)
        with Locations((-20, 14)):
            Circle(SKETCH6_R)
        with Locations((-40, 14)):
            Circle(SKETCH6_R)
    extrude(amount=-CUT_EXTRUDE4_DEPTH, mode=Mode.SUBTRACT)


solid = part.part
